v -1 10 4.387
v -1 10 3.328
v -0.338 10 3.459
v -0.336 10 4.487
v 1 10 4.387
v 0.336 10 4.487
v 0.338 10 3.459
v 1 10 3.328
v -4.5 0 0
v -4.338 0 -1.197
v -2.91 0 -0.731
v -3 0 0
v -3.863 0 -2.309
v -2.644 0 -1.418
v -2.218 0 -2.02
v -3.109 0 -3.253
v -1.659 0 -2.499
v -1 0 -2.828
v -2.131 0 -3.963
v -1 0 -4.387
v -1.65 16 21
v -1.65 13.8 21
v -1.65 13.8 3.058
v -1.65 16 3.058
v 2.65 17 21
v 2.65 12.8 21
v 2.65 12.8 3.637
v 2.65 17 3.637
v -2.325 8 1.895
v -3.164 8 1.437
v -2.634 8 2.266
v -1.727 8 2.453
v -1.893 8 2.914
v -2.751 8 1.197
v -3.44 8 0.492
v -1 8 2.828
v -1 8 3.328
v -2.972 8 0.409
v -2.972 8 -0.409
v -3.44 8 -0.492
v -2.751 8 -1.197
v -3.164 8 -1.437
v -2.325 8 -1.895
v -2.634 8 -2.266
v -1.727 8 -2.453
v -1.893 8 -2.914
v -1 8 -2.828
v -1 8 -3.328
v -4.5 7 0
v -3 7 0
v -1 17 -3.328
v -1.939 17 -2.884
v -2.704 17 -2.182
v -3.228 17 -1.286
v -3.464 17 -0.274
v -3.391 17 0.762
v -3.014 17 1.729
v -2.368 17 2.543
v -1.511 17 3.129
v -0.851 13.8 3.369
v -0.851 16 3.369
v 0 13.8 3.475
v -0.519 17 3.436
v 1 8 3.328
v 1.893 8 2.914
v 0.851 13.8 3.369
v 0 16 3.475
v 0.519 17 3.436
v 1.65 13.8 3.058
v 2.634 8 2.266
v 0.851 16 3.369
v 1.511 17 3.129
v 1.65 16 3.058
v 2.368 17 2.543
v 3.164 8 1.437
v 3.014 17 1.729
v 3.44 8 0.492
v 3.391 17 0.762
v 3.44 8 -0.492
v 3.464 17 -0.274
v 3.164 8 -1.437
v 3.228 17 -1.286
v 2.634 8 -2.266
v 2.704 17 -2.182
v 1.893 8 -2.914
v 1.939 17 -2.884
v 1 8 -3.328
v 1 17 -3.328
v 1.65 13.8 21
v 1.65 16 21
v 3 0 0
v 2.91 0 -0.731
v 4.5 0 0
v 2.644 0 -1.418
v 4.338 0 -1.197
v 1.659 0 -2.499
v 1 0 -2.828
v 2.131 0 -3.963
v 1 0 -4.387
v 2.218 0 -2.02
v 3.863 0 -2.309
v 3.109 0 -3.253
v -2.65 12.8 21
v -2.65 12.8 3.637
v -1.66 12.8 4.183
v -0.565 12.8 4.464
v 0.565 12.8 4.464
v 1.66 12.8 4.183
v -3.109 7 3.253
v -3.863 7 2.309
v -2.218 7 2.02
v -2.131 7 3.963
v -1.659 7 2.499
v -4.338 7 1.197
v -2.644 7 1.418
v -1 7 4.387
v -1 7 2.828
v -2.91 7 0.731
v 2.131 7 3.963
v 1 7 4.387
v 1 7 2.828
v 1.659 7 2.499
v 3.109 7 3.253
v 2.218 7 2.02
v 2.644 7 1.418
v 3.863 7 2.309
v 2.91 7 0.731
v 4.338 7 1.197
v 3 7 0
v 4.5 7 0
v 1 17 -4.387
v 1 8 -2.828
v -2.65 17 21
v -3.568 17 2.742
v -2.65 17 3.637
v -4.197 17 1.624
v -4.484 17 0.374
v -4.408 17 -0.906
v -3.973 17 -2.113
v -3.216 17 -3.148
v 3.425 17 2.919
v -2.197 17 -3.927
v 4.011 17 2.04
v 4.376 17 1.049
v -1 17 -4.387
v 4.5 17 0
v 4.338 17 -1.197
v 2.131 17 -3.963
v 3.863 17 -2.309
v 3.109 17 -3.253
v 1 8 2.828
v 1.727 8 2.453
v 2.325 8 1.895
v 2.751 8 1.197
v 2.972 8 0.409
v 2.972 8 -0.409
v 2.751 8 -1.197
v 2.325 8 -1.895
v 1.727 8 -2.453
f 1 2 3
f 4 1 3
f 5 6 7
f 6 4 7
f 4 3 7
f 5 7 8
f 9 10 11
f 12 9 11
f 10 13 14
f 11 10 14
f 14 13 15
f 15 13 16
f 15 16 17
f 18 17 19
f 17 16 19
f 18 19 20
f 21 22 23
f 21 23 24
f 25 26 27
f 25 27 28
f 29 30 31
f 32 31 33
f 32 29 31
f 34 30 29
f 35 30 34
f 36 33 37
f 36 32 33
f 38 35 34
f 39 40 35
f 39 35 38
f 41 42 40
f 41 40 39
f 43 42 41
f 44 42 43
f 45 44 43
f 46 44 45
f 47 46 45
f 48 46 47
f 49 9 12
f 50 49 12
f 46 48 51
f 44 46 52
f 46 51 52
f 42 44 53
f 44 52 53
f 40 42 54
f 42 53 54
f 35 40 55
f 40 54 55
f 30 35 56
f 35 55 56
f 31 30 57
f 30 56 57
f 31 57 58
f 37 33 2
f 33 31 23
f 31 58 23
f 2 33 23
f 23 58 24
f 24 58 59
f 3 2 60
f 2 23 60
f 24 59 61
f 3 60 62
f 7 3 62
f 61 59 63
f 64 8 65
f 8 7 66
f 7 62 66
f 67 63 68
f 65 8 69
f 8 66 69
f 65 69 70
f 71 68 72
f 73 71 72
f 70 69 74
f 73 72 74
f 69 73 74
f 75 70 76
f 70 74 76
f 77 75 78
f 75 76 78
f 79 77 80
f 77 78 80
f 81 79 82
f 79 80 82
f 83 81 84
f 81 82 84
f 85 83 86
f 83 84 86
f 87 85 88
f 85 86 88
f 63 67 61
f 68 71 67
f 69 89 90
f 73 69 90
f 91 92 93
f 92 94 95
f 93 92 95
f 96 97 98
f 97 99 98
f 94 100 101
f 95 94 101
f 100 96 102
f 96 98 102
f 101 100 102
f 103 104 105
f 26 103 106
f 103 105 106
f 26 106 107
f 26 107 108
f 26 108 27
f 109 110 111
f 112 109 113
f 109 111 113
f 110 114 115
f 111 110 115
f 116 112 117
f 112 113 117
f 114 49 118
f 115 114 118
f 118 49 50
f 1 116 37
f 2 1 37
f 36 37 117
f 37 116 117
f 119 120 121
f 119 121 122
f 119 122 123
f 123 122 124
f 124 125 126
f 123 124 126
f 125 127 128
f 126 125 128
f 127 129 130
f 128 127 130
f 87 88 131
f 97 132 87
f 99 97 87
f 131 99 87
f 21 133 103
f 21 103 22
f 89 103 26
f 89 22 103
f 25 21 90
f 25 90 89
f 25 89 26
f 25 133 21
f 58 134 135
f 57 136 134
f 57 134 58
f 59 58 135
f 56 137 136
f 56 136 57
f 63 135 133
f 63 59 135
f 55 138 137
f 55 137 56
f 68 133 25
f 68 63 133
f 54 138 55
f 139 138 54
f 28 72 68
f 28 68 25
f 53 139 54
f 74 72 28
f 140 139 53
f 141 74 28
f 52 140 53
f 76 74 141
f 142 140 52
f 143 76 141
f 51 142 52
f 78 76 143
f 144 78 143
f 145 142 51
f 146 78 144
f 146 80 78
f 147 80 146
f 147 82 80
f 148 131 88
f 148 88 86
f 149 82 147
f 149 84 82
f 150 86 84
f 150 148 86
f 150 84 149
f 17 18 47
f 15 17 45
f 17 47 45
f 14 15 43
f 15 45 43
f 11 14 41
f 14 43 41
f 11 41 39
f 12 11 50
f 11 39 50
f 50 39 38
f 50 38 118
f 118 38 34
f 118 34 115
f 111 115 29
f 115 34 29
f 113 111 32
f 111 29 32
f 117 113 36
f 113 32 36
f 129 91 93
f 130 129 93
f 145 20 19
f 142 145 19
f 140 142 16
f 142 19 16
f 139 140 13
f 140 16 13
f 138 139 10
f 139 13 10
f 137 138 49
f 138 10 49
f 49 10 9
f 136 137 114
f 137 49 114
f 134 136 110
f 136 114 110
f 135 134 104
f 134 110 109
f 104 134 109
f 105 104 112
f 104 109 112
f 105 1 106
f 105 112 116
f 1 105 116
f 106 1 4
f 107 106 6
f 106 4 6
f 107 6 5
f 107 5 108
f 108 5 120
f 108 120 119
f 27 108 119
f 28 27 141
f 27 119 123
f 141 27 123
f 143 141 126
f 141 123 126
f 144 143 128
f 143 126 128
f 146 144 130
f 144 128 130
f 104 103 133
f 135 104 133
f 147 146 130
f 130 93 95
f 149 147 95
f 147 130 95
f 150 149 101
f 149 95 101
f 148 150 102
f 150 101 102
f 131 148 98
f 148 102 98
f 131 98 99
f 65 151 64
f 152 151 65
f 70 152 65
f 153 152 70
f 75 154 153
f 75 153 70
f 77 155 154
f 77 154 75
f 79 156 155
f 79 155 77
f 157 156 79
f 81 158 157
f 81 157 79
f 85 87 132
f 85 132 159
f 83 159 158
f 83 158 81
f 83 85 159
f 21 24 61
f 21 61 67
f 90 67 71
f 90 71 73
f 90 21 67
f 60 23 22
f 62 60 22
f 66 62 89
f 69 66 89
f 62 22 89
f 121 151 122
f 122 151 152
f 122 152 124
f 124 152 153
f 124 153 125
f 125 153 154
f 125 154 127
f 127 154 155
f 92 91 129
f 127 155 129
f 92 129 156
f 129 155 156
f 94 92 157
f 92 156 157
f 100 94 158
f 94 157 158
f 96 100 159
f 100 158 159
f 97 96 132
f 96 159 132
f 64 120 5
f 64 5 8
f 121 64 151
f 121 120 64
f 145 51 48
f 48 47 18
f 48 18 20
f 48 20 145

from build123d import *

# Parameters (mm, degrees)
SKETCH5_R                = 4.5
BOSS_EXTRUDE2_DEPTH      = 17
SKETCH6_R                = 3.475
CUT_EXTRUDE2_DEPTH       = 9
SKETCH7_R                = 3
CUT_EXTRUDE3_DEPTH       = 9
SKETCH8_W                = 5.3
SKETCH8_H                = 4.2
BOSS_EXTRUDE3_DEPTH      = 18
SKETCH9_W                = 3.3
SKETCH9_H                = 2.2
CUT_EXTRUDE7_DEPTH       = 20
SKETCH22_W               = 2
SKETCH22_H               = 4.219602282
CUT_EXTRUDE17_DEPTH      = 10
SKETCH23_W               = 15.323048642
SKETCH23_H               = 5.208319784
CUT_EXTRUDE18_DEPTH      = 7
SKETCH24_W               = 2
SKETCH24_H               = 5.427023282
CUT_EXTRUDE19_DEPTH      = 18
CUT_EXTRUDE19_DEPTH_BACK = 1
SKETCH26_R               = 3.475
CUT_EXTRUDE21_DEPTH      = 7


with BuildPart() as part:
    # Sketch5 → Boss-Extrude2 (new body)
    with BuildSketch(Plane(origin=(0, 0, 0), x_dir=(1, 0, 0), z_dir=(0, 1, 0))):
        Circle(SKETCH5_R)
    extrude(amount=BOSS_EXTRUDE2_DEPTH)

    # Sketch6 → Cut-Extrude2 (cut)
    with BuildSketch(Plane(origin=(0, 17, 0), x_dir=(1, 0, 0), z_dir=(0, 1, 0))):
        Circle(SKETCH6_R)
    extrude(amount=-CUT_EXTRUDE2_DEPTH, mode=Mode.SUBTRACT)

    # Sketch7 → Cut-Extrude3 (cut, through all)
    with BuildSketch(Plane(origin=(0, 8, 0), x_dir=(1, 0, 0), z_dir=(0, 1, 0))):
        Circle(SKETCH7_R)
    extrude(amount=-CUT_EXTRUDE3_DEPTH, mode=Mode.SUBTRACT)

    # Sketch8 → Boss-Extrude3 (add)
    with BuildSketch(Plane.XY.offset(3)):
        with Locations((0, 14.9)):
            Rectangle(SKETCH8_W, SKETCH8_H)
    extrude(amount=BOSS_EXTRUDE3_DEPTH)

    # Sketch9 → Cut-Extrude7 (cut)
    with BuildSketch(Plane.XY.offset(21)):
        with Locations((0, 14.9)):
            Rectangle(SKETCH9_W, SKETCH9_H)
    extrude(amount=-CUT_EXTRUDE7_DEPTH, mode=Mode.SUBTRACT)

    # Sketch22 → Cut-Extrude17 (cut)
    with BuildSketch(Plane(origin=(0, 0, 0), x_dir=(1, 0, 0), z_dir=(0, 1, 0))):
        with Locations((0, -4.5)):
            Rectangle(SKETCH22_W, SKETCH22_H)
    extrude(amount=CUT_EXTRUDE17_DEPTH, mode=Mode.SUBTRACT)

    # Sketch23 → Cut-Extrude18 (cut)
    with BuildSketch(Plane(origin=(0, 0, 0), x_dir=(1, 0, 0), z_dir=(0, 1, 0))):
        with Locations((-0.238082605, -2.604159892)):
            Rectangle(SKETCH23_W, SKETCH23_H)
    extrude(amount=CUT_EXTRUDE18_DEPTH, mode=Mode.SUBTRACT)

    # Sketch24 → Cut-Extrude19 (cut, two sides)
    with BuildSketch(Plane(origin=(0, 0, 0), x_dir=(1, 0, 0), z_dir=(0, 1, 0))) as cut_extrude19_sk:
        with Locations((0, 4.5)):
            Rectangle(SKETCH24_W, SKETCH24_H)
    extrude(amount=CUT_EXTRUDE19_DEPTH, mode=Mode.SUBTRACT)
    extrude(cut_extrude19_sk.sketch, amount=-CUT_EXTRUDE19_DEPTH_BACK, mode=Mode.SUBTRACT)

    # Sketch26 → Cut-Extrude21 (cut)
    with BuildSketch(Plane(origin=(0, 17, 0), x_dir=(1, 0, 0), z_dir=(0, 1, 0))):
        Circle(SKETCH26_R)
    extrude(amount=-CUT_EXTRUDE21_DEPTH, mode=Mode.SUBTRACT)


solid = part.part
